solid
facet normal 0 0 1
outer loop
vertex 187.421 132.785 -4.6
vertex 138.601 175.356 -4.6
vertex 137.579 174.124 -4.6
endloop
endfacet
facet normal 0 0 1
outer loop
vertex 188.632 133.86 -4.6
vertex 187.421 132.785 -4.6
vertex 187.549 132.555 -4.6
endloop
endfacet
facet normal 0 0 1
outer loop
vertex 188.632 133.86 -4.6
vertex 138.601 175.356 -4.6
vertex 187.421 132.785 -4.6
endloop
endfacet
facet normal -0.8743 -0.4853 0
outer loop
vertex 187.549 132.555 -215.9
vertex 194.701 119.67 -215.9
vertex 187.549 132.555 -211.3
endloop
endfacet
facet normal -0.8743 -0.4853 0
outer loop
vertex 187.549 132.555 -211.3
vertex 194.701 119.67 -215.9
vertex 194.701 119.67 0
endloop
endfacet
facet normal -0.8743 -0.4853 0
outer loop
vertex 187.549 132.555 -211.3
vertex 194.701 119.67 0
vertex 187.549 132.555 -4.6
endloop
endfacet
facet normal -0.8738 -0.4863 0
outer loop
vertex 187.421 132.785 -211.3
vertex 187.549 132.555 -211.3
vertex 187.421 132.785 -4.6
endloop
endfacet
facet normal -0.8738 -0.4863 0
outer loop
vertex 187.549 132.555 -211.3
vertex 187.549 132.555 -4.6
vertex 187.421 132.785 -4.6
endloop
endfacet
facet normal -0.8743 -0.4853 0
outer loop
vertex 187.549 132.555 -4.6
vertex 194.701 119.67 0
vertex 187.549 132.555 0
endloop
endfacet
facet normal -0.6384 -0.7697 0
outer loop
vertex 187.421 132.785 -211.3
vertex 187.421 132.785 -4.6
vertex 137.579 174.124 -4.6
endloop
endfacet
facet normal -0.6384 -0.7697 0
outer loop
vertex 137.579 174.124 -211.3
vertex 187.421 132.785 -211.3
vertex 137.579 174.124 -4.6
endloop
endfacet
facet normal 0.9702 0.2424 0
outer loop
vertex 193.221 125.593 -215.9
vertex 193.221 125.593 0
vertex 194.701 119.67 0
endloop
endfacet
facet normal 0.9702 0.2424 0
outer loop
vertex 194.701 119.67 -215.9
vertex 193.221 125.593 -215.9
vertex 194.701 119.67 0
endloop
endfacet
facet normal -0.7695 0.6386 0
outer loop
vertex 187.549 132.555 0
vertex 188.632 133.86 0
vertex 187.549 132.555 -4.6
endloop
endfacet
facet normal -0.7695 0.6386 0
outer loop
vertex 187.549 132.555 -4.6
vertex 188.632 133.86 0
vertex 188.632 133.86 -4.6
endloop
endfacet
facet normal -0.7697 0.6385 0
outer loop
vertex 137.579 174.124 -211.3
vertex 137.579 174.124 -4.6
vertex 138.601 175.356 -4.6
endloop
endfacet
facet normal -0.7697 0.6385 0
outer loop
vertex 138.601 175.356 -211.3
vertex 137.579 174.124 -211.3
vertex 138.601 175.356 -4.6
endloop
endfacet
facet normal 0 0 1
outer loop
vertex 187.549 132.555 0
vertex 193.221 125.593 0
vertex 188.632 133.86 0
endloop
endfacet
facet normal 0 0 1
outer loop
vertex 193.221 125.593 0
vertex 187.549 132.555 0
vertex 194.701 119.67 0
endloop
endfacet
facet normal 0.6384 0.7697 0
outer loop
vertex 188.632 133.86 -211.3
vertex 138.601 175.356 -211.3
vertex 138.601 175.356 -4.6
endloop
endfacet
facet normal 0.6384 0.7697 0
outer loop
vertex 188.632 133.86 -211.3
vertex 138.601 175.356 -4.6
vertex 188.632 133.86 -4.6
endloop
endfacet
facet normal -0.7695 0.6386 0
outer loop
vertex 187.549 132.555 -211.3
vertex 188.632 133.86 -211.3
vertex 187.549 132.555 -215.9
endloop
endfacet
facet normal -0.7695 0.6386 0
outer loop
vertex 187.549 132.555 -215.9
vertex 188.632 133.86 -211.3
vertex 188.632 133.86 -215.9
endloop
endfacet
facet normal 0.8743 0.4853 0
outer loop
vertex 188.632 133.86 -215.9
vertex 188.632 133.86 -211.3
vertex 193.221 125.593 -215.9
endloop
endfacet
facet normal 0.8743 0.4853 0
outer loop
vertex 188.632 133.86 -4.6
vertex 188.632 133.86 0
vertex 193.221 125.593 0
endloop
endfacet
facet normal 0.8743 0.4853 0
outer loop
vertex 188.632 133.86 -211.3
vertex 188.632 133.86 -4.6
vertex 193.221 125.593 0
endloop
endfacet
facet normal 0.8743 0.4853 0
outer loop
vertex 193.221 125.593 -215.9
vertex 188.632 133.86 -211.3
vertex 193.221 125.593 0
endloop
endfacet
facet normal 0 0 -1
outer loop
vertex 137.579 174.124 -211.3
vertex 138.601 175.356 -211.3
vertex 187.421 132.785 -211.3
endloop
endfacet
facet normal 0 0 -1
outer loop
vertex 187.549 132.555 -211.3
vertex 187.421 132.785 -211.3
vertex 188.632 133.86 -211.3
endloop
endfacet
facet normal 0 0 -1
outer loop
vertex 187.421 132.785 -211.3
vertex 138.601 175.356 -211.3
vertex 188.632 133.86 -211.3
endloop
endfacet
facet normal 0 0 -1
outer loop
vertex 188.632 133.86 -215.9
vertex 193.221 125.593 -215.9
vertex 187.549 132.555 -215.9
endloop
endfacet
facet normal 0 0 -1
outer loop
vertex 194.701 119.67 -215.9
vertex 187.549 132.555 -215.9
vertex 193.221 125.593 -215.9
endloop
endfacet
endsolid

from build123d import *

# Parameters (mm, degrees)
BOSS_EXTRUDE1_DEPTH = 215.9
SKETCH2_W           = 65
SKETCH2_H           = 4.6
CUT_EXTRUDE1_DEPTH  = 229.165913841


with BuildPart() as part:
    # Sketch1 → Boss-Extrude1 (new body)
    with BuildSketch(Plane.XY):
        Polygon((187.42097357, 132.785097993), (137.579115796, 174.124053731), (138.600551034, 175.35558532), (188.63152184, 133.859778782), (193.220657018, 125.592655419), (194.701118326, 119.670240299), align=None)
    extrude(amount=-BOSS_EXTRUDE1_DEPTH)

    # Sketch2 → Cut-Extrude1 (cut, through all)
    with BuildSketch(Plane(origin=(142.652779273, 171.994657551, 0), x_dir=(0.7697072431709691, -0.6383970236538912, 0), z_dir=(0.6383970236538911, 0.769707243170969, 0))):
        with Locations((27.235364289, 2.3)):
            Rectangle(SKETCH2_W, SKETCH2_H)
        with Locations((27.235364289, 213.6)):
            Rectangle(SKETCH2_W, SKETCH2_H)
    extrude(amount=-CUT_EXTRUDE1_DEPTH, mode=Mode.SUBTRACT)


solid = part.part
